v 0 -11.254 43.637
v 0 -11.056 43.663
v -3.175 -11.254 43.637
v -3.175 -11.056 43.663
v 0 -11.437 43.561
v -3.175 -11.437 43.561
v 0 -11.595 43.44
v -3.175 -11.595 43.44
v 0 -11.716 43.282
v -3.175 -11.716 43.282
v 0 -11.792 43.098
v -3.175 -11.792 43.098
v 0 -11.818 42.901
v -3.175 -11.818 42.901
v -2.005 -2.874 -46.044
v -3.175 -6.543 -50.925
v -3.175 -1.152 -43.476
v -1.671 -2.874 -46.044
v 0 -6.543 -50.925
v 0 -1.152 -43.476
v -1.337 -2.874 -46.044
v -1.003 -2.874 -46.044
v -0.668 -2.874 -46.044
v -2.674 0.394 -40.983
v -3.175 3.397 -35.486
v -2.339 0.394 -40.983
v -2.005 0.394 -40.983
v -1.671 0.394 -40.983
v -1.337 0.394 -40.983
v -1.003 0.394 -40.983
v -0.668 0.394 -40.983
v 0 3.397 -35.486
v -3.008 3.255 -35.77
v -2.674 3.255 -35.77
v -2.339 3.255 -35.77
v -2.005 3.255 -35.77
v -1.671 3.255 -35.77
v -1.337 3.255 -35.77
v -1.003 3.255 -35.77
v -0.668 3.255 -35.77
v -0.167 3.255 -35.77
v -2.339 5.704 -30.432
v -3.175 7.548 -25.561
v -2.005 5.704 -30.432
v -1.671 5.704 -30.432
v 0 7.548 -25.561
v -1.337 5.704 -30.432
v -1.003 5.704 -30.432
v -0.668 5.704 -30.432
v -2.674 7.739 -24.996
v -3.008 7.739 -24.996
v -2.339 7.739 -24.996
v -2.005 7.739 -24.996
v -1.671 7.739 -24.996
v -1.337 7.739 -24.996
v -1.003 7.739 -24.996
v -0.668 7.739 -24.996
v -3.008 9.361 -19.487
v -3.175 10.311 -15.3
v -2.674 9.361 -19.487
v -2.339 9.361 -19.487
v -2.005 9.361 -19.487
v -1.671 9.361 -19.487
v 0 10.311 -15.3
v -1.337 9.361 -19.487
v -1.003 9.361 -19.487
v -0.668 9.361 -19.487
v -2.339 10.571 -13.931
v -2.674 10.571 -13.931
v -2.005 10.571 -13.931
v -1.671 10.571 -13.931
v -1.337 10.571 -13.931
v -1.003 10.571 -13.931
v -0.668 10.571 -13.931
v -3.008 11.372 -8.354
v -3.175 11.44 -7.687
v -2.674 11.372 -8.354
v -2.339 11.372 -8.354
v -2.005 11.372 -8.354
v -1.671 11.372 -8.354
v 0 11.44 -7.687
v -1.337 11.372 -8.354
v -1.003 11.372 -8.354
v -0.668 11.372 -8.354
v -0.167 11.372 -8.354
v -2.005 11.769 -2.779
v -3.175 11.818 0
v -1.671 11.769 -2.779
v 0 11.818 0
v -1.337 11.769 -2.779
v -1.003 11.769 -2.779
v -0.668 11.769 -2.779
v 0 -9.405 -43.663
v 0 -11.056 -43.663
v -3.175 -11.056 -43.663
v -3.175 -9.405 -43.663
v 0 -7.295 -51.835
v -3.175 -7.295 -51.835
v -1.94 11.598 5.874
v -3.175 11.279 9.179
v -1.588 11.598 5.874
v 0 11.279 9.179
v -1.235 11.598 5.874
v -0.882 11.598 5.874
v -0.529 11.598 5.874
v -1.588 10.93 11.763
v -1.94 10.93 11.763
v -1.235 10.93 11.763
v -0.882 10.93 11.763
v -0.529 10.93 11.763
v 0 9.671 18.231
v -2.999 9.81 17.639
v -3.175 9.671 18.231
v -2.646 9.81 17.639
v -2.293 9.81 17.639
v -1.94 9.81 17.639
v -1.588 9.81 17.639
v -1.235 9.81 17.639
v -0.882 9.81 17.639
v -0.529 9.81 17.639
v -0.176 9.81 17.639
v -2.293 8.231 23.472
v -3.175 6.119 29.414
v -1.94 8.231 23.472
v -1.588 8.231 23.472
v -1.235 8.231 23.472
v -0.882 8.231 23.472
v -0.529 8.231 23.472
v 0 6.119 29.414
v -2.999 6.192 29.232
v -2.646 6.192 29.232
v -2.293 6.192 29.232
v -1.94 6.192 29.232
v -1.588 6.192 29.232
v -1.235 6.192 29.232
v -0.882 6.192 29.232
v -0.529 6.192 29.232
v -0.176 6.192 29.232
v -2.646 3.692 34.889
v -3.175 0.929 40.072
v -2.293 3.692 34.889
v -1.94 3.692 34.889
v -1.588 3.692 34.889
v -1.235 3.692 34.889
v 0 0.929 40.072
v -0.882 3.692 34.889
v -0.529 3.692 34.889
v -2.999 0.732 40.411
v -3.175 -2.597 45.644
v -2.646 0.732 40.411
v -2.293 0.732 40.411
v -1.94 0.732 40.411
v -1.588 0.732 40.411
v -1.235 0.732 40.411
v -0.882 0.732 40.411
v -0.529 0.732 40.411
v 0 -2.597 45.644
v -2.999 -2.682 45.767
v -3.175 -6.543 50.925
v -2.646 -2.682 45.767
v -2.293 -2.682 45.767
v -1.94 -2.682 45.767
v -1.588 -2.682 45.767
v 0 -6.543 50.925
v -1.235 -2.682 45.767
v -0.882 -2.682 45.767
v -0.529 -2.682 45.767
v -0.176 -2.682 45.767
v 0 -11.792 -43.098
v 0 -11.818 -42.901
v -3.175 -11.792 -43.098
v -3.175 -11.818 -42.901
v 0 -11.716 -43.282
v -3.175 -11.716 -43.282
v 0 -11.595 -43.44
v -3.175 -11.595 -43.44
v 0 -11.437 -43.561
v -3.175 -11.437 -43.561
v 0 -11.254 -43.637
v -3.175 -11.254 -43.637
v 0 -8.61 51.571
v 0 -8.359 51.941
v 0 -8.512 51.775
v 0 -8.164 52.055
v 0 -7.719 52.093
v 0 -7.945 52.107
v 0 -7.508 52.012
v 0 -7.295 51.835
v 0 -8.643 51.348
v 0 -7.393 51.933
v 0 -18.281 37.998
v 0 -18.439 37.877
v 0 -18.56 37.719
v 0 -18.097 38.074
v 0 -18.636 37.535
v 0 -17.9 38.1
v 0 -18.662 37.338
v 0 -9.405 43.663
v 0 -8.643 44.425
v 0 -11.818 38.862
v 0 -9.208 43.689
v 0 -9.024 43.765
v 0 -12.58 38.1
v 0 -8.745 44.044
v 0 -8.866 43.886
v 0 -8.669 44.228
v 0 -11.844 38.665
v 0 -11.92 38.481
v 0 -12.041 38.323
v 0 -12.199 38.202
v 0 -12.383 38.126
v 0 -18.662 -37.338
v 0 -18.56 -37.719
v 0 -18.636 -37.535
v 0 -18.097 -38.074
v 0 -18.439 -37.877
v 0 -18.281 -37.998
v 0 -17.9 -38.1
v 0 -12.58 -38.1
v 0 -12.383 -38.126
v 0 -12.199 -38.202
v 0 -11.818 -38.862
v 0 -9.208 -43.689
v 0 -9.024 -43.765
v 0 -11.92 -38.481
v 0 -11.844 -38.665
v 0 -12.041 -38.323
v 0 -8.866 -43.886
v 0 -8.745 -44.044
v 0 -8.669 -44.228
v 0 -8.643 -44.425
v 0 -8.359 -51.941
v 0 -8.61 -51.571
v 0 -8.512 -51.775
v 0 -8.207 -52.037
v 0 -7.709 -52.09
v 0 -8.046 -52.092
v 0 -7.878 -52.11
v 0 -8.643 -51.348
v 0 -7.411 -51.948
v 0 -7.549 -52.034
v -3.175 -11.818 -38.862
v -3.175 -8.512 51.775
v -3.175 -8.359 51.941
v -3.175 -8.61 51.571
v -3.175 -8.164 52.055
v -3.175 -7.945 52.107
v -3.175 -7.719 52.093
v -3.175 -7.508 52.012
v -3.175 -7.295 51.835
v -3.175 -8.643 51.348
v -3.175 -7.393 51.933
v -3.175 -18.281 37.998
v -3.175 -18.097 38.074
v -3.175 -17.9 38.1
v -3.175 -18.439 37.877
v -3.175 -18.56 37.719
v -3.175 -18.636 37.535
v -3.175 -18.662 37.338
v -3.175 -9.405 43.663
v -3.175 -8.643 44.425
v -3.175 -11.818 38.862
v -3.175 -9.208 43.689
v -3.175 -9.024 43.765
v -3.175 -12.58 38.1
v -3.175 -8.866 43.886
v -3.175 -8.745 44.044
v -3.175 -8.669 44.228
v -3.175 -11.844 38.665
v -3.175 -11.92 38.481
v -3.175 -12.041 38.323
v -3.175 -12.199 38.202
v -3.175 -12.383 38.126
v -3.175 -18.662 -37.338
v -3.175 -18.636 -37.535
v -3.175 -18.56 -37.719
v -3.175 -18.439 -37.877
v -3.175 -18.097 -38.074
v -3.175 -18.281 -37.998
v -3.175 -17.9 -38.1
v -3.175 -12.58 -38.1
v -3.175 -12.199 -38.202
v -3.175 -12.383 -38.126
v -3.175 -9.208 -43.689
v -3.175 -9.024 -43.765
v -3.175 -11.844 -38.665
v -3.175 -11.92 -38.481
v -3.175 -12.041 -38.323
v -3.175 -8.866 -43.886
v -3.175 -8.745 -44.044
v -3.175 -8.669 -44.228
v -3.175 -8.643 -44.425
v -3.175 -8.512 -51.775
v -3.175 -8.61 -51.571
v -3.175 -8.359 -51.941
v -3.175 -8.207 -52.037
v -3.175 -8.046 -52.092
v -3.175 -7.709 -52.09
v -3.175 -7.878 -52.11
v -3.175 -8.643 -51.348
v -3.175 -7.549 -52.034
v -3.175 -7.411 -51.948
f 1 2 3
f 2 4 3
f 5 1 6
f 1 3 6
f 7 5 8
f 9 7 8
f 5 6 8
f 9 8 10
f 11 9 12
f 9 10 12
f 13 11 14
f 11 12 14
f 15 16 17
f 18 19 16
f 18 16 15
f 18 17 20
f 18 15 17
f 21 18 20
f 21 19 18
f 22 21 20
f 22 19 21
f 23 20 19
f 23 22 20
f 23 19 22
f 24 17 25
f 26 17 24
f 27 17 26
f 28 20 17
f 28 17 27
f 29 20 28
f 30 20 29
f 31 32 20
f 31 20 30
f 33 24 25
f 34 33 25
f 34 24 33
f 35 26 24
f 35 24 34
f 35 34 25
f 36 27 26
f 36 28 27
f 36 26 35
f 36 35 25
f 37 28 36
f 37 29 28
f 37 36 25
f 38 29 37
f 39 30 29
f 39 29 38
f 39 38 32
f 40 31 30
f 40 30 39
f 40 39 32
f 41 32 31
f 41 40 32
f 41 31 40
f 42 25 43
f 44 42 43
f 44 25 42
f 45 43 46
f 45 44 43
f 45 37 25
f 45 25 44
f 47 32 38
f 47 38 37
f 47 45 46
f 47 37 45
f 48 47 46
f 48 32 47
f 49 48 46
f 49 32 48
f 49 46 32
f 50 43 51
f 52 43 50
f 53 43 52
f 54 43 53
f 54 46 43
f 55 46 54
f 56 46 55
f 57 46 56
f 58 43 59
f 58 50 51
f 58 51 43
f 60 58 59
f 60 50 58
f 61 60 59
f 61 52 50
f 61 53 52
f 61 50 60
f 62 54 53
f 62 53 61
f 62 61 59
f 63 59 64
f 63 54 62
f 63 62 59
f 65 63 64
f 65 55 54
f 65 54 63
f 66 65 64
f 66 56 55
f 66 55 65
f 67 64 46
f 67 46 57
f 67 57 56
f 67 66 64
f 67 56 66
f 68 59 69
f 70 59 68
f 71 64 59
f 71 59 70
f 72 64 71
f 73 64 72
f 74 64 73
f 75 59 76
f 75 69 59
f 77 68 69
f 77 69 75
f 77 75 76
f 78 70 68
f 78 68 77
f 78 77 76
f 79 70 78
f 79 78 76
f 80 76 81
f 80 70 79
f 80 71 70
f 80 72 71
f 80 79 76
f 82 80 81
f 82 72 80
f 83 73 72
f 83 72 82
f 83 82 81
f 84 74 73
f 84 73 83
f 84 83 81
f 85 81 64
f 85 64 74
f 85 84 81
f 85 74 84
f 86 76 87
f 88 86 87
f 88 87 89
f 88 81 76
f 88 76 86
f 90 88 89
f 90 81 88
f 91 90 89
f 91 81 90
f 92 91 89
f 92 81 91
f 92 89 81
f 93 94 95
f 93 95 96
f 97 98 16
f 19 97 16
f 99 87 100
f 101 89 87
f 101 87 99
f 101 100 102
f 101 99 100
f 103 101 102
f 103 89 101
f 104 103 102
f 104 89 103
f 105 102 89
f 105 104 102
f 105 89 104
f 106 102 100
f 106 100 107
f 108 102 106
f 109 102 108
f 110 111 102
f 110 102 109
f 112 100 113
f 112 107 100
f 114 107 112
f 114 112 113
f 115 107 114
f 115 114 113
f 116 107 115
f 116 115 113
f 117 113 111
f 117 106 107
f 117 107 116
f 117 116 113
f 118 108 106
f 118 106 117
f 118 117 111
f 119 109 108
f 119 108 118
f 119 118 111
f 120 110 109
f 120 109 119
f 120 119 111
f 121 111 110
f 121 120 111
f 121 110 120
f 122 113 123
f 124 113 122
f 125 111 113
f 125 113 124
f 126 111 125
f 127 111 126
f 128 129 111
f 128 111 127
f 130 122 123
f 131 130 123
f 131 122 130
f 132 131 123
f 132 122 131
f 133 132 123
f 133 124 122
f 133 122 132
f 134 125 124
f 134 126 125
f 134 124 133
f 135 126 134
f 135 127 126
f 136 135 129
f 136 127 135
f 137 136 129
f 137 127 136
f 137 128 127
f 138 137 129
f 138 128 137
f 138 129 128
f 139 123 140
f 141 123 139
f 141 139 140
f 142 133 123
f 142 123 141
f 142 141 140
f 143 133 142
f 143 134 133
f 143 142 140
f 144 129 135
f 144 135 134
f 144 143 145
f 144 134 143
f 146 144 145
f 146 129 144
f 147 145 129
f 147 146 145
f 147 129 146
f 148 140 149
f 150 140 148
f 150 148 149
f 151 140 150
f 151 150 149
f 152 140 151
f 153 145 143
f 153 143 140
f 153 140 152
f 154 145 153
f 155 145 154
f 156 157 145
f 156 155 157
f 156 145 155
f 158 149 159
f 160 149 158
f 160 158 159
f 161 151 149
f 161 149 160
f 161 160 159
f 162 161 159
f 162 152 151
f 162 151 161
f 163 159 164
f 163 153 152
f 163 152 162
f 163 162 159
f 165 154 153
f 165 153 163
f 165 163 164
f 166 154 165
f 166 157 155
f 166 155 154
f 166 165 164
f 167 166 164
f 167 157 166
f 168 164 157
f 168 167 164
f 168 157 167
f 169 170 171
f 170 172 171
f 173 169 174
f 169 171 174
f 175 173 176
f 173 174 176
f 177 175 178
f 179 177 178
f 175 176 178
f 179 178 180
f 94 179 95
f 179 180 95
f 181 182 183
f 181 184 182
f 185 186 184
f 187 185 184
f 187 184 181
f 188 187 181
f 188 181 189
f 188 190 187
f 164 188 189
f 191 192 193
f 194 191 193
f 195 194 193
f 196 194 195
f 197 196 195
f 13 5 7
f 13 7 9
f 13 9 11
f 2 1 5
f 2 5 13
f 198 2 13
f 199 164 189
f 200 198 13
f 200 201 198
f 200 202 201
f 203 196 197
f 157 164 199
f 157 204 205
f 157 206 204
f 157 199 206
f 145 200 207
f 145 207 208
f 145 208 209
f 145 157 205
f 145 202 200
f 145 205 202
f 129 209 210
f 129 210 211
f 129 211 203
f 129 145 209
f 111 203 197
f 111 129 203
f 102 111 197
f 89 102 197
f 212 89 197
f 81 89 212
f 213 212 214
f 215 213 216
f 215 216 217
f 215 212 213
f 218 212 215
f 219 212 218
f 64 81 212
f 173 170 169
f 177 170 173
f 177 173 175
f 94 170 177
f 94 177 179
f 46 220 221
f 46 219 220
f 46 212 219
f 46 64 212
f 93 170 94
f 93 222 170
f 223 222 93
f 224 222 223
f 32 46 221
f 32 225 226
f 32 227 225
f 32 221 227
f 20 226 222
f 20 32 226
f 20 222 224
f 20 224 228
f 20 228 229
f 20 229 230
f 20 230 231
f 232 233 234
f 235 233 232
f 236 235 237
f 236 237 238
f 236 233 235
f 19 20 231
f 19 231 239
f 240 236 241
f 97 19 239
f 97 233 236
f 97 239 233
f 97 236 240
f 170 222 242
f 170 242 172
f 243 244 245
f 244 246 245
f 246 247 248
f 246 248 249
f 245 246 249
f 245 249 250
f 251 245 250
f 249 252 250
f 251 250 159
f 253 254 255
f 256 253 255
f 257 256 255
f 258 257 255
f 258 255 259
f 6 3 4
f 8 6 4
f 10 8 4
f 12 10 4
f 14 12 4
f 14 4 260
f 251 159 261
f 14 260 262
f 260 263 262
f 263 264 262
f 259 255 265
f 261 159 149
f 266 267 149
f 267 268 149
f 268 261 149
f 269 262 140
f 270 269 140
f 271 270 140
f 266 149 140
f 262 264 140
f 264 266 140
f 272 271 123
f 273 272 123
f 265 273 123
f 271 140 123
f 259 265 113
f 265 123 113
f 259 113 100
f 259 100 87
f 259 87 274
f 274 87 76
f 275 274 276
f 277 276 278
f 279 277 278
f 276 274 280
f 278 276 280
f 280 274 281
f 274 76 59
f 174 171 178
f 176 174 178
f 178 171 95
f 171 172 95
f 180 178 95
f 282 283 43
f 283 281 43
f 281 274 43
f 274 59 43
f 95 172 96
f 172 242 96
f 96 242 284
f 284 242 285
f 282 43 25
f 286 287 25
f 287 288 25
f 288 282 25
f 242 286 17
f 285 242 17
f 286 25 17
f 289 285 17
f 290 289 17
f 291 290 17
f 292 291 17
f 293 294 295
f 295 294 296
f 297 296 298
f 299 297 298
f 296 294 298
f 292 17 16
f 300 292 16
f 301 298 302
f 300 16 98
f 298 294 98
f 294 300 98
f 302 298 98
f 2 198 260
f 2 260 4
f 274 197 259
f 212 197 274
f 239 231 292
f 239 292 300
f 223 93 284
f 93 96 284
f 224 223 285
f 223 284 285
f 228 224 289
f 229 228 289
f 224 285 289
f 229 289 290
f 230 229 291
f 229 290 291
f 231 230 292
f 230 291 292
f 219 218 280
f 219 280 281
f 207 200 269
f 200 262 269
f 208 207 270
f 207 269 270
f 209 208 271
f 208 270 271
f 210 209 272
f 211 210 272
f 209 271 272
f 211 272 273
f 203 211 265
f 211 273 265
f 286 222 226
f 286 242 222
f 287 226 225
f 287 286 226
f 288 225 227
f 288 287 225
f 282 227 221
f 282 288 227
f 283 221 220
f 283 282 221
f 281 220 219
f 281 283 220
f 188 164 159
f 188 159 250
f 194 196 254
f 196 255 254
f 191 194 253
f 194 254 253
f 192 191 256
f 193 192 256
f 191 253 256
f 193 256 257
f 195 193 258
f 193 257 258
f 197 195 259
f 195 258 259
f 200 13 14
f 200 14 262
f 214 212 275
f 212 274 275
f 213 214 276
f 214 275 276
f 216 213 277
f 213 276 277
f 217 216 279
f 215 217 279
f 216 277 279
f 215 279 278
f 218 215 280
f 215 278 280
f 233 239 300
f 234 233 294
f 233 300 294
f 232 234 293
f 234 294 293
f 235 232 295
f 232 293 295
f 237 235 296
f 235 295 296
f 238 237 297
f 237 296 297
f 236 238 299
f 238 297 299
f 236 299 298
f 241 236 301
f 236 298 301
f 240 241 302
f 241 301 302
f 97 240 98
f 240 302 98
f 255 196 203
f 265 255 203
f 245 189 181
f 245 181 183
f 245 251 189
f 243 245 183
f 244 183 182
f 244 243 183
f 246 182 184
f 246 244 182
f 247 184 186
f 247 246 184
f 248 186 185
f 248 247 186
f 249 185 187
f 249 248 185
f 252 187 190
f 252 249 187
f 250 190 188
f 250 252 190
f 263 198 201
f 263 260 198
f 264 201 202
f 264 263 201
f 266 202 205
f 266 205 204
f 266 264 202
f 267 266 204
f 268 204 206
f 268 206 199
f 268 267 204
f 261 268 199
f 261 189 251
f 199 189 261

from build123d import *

# Parameters (mm, degrees)
BOSS_EXTRUDE1_DEPTH = 3.175
SKETCH1_3_W         = 76.2
SKETCH1_3_H         = 6.843416336
BOSS_EXTRUDE2_DEPTH = 3.175
FILLET1_R           = 0.762


with BuildPart() as part:
    # Sketch1 → Boss-Extrude1 (new body)
    with BuildSketch(Plane(origin=(0, 0, 0), x_dir=(0, 0, -1), z_dir=(1, 0, 0))):
        with BuildLine():
            Line((-43.663217685, -8.64329225), (-43.663217685, -11.81829225))
            Line((-43.663217685, -11.81829225), (-38.1, -11.81829225))
            Line((-38.1, -11.81829225), (38.1, -11.81829225))
            Line((38.1, -11.81829225), (43.663218279, -11.81829225))
            Line((43.663218279, -11.81829225), (43.663218279, -8.64329225))
            Line((43.663218279, -8.64329225), (53.425755965, -8.64329225))
            add(Edge.make_bspline(
                [(53.425755965, -8.64329225), (53.263215222, -8.501846261), (52.438865838, -7.790883032), (51.598732776, -7.098646879), (50.924889325, -6.543426735)],
                knots=[0.589295503, 0.589295503, 0.589295503, 0.589295503, 0.670587257, 1, 1, 1, 1], degree=3))
            add(Edge.make_bspline(
                [(50.924889325, -6.543426735), (50.124144808, -5.909206331), (48.528125823, -4.645098009), (46.059087128, -2.864191401), (43.549887667, -1.177645044), (40.997889023, 0.406107926), (38.408155063, 1.888342774), (35.783665586, 3.267940071), (33.127912186, 4.544590036), (30.444209343, 5.717936201), (27.735877167, 6.787796608), (25.006192871, 7.754099696), (22.258403703, 8.616894329), (19.495723603, 9.376346971), (16.721334228, 10.032717883), (13.938384845, 10.586434135), (11.149992554, 11.03779968), (8.359242424, 11.388052771), (5.569187679, 11.635427625), (2.782849792, 11.78974762), (0.926482231, 11.808788455), (1.344e-06, 11.818291406)],
                knots=[0, 0, 0, 0, 0.055514859, 0.110650485, 0.165414313, 0.219814889, 0.273861748, 0.327565289, 0.380936647, 0.43398757, 0.486730286, 0.53917738, 0.59134167, 0.643236089, 0.694873565, 0.746266915, 0.797428738, 0.848371322, 0.899106551, 0.949645827, 1, 1, 1, 1], degree=3))
            add(Edge.make_bspline(
                [(1.344e-06, 11.818291406), (-0.978048688, 11.807700808), (-2.937955589, 11.78647839), (-5.879617768, 11.614460814), (-8.825050086, 11.338662737), (-11.770693383, 10.948099308), (-14.712949005, 10.444720364), (-17.648178684, 9.827137854), (-20.57270433, 9.095020044), (-23.482807764, 8.247912067), (-26.374730804, 7.285560858), (-29.244674098, 6.207832855), (-32.088800801, 5.014747428), (-34.903222204, 3.706458544), (-37.684051606, 2.283328938), (-40.427201271, 0.74568464), (-43.129148213, -0.90523213), (-45.784047279, -2.670825623), (-48.3946206, -4.541678592), (-50.079432356, -5.874568434), (-50.924883817, -6.543422779)],
                knots=[0, 0, 0, 0, 0.053156962, 0.106520825, 0.160104405, 0.213921194, 0.267985268, 0.32231118, 0.376913837, 0.431808373, 0.48701001, 0.542533909, 0.598395017, 0.654607907, 0.711186615, 0.76814447, 0.825493932, 0.883246422, 0.941412159, 1, 1, 1, 1], degree=3))
            add(Edge.make_bspline(
                [(-50.924883817, -6.543422779), (-51.598727834, -7.098643313), (-52.438862565, -7.790880746), (-53.263213559, -8.501845329), (-53.425755371, -8.64329225)],
                knots=[0, 0, 0, 0, 0.32941274, 0.410704965, 0.410704965, 0.410704965, 0.410704965], degree=3))
            Line((-53.425755371, -8.64329225), (-43.663217685, -8.64329225))
        make_face()
    extrude(amount=-BOSS_EXTRUDE1_DEPTH)

    # Sketch1<3> → Boss-Extrude2 (add)
    with BuildSketch(Plane(origin=(0, 0, 0), x_dir=(0, 0, -1), z_dir=(1, 0, 0))):
        with Locations((0, -15.240000418)):
            Rectangle(SKETCH1_3_W, SKETCH1_3_H)
    extrude(amount=-BOSS_EXTRUDE2_DEPTH)

    # Fillet1
    fillet1_edges = [part.edges().sort_by_distance(p)[0] for p in [
        (-1.5875, -8.64329225, -53.425755965),
        (-1.5875, -8.64329225, -43.663218279),
        (-1.5875, -11.81829225, -43.663218279),
        (-1.5875, -11.81829225, 43.663217685),
        (-1.5875, -8.64329225, 43.663217685),
        (-1.5875, -8.64329225, 53.425755371),
        (-1.5875, -18.661708586, -38.1),
        (-1.5875, -11.81829225, -38.1),
        (-1.5875, -18.661708586, 38.1),
        (-1.5875, -11.81829225, 38.1),
    ]]
    fillet(fillet1_edges, radius=FILLET1_R)


solid = part.part
